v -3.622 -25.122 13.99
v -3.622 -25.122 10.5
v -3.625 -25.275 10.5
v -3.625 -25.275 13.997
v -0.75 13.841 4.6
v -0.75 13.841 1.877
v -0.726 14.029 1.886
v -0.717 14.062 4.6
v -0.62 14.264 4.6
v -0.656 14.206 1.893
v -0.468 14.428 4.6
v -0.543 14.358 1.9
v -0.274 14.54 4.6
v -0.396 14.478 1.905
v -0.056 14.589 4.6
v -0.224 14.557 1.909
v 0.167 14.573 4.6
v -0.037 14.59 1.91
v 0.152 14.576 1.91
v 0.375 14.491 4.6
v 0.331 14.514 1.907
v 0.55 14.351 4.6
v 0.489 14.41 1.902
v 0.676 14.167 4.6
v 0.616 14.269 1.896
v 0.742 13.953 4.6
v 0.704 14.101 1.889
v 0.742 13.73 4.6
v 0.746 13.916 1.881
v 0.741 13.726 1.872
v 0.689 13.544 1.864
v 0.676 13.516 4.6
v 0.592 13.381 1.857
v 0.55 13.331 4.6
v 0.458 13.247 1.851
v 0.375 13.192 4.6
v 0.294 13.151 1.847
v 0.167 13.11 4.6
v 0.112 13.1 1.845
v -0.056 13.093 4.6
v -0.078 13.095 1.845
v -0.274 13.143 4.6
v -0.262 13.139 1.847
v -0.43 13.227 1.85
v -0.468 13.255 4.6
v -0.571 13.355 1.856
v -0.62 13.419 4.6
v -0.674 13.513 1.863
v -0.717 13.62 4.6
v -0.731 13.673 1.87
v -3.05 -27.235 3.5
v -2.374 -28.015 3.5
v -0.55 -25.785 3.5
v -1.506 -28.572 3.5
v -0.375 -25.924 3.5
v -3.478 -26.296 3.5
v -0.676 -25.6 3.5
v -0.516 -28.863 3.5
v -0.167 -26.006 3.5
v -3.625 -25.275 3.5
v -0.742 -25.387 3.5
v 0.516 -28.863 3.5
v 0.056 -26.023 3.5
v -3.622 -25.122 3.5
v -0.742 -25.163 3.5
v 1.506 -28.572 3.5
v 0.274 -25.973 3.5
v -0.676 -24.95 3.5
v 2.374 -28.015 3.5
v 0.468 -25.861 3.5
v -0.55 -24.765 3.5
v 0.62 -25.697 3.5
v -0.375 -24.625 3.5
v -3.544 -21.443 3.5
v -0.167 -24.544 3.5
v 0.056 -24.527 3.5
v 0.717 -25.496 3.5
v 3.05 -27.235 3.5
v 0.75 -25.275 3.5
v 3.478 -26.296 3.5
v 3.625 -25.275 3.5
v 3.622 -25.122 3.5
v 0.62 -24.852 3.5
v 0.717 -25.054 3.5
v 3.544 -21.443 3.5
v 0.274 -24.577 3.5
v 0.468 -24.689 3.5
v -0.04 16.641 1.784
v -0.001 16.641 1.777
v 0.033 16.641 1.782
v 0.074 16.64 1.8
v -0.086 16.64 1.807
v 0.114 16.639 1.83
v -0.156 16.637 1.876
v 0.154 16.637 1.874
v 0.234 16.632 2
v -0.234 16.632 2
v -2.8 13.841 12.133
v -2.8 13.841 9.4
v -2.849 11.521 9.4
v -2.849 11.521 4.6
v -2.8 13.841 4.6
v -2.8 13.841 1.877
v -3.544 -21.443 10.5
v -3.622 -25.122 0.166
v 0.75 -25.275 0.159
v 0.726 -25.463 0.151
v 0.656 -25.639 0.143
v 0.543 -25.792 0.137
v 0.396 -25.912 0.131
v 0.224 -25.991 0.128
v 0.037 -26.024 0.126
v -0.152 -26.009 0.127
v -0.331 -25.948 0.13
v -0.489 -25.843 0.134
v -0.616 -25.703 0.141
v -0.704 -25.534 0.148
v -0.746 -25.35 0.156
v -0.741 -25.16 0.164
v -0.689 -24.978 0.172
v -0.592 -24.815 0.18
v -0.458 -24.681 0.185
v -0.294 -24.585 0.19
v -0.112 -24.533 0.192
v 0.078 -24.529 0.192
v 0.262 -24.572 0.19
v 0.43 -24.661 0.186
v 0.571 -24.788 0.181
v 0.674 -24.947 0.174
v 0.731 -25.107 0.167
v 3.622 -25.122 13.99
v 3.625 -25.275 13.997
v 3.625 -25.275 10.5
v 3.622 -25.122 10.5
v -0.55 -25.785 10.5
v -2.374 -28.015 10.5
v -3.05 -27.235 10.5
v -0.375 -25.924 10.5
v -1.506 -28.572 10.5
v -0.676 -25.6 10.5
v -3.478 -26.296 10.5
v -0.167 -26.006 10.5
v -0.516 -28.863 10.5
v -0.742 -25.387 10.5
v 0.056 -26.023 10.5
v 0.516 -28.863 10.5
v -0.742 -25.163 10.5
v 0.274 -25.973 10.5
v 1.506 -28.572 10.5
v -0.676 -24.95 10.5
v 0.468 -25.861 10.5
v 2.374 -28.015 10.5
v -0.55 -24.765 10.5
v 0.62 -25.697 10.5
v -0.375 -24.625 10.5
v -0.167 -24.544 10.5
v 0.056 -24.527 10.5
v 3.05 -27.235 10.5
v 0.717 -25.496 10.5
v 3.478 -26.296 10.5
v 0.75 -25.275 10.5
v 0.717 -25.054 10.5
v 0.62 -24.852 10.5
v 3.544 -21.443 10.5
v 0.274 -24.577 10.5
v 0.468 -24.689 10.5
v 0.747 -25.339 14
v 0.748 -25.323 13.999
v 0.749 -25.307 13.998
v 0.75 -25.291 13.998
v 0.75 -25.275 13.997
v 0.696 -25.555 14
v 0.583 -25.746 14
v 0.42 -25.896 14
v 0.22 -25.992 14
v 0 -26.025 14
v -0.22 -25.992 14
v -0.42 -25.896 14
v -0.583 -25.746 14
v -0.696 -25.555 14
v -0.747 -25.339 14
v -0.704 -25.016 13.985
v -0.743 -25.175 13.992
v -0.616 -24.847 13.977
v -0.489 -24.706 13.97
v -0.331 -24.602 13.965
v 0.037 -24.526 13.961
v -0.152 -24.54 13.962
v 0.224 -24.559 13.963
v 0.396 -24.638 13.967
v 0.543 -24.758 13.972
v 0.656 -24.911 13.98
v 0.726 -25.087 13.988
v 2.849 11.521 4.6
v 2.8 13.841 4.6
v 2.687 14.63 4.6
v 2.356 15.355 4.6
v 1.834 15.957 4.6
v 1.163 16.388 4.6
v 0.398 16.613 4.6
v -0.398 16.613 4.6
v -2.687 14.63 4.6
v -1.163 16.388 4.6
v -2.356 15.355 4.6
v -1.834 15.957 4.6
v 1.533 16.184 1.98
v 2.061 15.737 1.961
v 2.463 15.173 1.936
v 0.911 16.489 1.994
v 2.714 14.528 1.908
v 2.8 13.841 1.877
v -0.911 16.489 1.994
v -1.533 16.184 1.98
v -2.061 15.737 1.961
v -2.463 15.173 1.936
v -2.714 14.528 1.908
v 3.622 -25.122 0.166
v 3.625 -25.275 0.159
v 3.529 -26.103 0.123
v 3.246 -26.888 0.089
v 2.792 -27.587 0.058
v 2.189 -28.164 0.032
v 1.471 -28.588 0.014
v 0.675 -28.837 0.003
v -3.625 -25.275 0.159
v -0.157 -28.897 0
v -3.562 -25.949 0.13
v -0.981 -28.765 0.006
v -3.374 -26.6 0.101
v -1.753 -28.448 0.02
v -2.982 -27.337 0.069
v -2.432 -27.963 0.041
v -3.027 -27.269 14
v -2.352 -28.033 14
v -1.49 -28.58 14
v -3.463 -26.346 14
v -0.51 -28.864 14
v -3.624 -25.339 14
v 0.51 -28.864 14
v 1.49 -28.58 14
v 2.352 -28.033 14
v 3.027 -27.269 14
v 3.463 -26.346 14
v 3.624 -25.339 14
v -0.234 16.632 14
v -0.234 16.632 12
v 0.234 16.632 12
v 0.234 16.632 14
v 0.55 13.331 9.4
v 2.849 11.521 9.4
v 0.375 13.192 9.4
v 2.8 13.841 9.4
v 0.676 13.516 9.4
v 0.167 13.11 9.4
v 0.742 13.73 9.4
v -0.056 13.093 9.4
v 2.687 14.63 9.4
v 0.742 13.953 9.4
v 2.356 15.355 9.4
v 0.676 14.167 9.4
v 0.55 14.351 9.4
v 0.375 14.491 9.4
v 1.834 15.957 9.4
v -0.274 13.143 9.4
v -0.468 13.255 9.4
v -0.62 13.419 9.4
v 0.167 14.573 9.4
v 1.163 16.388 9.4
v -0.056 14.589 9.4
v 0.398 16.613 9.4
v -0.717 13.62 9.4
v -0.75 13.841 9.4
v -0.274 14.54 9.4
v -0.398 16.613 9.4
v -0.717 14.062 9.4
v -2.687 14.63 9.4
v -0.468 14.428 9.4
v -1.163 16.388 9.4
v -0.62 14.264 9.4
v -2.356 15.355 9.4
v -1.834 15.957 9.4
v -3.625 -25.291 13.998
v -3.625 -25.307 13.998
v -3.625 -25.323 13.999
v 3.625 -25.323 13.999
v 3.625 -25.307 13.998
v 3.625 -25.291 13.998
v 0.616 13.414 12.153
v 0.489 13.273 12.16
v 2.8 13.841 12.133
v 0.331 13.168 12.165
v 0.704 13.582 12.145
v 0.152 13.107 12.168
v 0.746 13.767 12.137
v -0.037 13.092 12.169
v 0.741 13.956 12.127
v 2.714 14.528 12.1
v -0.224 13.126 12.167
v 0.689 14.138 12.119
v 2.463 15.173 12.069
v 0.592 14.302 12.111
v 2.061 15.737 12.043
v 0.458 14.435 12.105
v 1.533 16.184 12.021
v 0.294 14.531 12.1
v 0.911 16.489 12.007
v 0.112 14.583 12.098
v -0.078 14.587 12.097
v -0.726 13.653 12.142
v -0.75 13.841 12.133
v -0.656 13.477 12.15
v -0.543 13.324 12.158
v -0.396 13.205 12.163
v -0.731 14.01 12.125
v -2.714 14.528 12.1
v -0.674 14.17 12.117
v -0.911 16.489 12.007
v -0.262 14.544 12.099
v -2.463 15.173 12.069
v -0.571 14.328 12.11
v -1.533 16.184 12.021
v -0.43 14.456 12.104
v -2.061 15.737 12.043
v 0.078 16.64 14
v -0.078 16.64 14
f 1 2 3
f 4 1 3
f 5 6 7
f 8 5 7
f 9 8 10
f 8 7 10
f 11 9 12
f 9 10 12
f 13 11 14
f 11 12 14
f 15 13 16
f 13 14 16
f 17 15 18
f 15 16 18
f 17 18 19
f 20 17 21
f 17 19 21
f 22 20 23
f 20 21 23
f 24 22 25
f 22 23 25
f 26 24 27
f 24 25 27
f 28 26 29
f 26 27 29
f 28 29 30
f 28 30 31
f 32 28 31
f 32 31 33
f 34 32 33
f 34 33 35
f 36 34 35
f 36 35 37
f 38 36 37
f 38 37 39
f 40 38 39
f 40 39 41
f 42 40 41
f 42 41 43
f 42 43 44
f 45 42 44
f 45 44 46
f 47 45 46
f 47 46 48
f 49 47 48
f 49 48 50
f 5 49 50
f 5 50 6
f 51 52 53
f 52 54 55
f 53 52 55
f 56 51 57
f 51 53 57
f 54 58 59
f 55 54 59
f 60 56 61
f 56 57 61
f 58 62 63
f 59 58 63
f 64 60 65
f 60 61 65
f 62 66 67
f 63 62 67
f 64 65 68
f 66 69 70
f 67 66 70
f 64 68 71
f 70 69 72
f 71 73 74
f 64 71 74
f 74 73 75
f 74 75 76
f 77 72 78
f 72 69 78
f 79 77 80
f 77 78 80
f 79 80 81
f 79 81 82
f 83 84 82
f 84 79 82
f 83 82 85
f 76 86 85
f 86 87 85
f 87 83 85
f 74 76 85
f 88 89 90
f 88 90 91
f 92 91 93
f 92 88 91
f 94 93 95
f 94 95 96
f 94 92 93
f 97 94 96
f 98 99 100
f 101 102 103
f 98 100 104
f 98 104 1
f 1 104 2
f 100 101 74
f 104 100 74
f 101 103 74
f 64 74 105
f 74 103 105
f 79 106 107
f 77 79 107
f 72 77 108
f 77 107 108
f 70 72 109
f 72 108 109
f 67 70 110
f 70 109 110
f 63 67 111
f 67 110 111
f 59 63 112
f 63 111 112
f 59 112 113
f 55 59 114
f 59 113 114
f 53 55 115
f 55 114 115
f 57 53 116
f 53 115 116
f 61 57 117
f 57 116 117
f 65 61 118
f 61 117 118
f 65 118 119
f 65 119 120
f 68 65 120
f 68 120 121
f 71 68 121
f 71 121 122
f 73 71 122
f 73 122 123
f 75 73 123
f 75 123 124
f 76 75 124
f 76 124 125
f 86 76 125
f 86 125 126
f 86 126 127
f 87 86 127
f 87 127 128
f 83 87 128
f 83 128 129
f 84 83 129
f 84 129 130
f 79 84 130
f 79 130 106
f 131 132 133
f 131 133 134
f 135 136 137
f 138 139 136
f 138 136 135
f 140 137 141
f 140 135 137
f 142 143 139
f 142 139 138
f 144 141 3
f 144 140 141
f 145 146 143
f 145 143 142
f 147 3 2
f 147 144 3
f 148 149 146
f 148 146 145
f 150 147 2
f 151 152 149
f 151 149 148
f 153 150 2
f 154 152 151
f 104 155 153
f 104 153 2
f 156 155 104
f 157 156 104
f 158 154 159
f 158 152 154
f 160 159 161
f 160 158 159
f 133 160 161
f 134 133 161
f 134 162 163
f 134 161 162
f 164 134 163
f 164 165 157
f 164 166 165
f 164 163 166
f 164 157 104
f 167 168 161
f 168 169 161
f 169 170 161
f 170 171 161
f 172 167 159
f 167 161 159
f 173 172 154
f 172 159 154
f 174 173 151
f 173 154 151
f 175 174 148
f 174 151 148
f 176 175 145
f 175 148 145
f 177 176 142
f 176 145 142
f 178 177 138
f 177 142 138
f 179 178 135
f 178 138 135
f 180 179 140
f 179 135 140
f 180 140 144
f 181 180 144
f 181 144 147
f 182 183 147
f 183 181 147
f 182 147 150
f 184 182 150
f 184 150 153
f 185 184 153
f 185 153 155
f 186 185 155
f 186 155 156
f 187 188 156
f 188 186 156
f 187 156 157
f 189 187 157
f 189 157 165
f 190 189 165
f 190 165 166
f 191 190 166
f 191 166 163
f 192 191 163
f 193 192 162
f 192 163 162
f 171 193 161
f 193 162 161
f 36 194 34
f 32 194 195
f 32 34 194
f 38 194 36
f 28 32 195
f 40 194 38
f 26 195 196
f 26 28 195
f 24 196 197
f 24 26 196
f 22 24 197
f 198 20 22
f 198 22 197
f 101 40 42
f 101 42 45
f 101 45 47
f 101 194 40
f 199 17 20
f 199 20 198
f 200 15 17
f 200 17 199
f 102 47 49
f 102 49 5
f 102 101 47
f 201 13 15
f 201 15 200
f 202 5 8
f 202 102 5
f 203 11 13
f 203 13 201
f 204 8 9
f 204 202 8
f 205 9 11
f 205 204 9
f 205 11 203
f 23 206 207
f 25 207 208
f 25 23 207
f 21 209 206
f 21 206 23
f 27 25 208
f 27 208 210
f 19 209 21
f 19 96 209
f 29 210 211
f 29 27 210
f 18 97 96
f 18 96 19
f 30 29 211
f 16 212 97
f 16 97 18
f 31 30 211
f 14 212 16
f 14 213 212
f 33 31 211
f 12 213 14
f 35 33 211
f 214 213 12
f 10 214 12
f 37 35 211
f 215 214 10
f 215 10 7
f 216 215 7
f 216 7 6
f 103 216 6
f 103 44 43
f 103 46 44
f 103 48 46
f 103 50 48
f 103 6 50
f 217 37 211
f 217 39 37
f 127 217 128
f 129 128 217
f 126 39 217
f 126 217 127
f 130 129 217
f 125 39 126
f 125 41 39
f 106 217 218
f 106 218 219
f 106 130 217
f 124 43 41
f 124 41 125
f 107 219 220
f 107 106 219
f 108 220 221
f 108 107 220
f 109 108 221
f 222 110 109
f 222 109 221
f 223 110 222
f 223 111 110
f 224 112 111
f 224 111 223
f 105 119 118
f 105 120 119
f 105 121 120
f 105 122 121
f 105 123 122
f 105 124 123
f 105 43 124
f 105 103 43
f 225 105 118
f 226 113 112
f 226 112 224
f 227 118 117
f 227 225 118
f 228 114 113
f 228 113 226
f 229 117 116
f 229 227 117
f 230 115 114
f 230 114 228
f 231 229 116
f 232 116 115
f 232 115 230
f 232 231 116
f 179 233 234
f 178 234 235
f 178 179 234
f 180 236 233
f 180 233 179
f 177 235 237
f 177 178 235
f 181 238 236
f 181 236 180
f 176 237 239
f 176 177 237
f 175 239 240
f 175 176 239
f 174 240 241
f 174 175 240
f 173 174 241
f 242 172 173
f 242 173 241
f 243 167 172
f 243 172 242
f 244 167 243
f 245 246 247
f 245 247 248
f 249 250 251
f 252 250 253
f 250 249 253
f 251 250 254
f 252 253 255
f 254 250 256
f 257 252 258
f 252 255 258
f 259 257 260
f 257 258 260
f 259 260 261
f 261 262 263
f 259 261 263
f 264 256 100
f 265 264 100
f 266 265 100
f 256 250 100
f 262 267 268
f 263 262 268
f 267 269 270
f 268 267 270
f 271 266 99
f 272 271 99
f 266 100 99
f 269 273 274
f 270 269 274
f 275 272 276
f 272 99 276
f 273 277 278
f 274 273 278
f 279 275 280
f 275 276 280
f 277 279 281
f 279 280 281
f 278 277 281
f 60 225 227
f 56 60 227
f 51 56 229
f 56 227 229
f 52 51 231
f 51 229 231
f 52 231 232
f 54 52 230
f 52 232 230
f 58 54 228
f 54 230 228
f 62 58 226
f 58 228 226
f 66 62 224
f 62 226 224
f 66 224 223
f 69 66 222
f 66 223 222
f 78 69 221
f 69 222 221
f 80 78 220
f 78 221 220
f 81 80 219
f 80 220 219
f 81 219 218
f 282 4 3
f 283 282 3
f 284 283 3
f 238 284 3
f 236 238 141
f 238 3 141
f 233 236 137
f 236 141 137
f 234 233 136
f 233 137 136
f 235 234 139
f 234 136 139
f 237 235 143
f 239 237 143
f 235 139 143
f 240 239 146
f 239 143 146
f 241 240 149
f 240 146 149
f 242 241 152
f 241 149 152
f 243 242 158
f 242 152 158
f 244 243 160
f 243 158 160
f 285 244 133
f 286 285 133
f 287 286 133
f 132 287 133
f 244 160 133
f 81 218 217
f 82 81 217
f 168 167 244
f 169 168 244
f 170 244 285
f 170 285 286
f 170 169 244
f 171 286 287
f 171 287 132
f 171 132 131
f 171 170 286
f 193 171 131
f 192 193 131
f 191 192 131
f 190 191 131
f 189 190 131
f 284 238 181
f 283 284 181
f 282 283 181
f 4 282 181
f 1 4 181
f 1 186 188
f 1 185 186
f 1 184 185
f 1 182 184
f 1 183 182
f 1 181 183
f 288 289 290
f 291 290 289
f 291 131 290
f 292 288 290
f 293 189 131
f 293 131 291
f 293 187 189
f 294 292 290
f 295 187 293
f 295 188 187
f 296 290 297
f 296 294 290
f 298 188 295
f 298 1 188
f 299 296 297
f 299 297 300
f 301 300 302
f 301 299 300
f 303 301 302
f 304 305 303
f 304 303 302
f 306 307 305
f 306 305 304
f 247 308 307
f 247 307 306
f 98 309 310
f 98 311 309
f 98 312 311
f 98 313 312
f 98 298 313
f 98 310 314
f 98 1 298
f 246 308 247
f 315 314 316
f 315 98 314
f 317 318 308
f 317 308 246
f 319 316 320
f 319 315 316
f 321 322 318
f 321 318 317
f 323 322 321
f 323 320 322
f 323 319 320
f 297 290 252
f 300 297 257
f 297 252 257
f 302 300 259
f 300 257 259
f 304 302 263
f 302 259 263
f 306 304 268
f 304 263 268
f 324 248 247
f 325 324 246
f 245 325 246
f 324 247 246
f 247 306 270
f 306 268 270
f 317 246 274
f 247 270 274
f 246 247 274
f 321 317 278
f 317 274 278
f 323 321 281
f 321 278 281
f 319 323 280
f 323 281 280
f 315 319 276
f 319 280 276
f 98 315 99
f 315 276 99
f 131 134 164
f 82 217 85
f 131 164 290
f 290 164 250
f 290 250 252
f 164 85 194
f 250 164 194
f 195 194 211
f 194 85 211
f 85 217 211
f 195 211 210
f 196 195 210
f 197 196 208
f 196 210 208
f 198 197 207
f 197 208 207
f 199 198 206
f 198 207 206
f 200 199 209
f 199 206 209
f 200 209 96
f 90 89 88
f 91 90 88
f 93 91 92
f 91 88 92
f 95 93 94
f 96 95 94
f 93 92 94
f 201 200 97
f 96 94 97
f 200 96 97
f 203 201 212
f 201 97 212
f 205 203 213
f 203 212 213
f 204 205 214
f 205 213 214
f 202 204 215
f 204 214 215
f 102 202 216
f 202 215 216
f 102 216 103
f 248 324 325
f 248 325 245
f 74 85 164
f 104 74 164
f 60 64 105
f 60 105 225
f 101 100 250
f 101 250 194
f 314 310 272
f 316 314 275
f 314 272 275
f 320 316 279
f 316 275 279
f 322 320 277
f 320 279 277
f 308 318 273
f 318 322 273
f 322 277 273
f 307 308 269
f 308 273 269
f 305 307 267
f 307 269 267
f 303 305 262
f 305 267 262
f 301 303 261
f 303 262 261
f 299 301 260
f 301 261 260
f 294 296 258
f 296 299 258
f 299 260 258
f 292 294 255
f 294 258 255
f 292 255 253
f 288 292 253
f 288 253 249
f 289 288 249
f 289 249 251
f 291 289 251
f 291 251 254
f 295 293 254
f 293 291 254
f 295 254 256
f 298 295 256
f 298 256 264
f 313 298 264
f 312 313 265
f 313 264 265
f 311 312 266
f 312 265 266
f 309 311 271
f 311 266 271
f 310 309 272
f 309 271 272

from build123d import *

# Parameters (mm, degrees)
F1_DEPTH = 14
F2_W     = 11.5
F2_H     = 2.4
F2_W_2   = 7.4604106426
F2_H_2   = 3.5
F3_DEPTH = 12.5


with BuildPart() as f1:
    # F0 (on Top) → F1 (new body)
    with BuildSketch(Plane.XY):
        with BuildLine():
            Line((3.625, -25.2749305218), (3.6217764293, -25.1220891128))
            ThreePointArc((3.6217764293, -25.1220891128), (0, -21.6499305218), (-3.6217764293, -25.1220891128))
            Line((-3.6217764293, -25.1220891128), (-3.625, -25.2749305218))
            Line((-3.625, -25.2749305218), (-0.75, -25.2749305218))
            ThreePointArc((-0.75, -25.2749305218), (0, -24.5249305218), (0.75, -25.2749305218))
            Line((0.75, -25.2749305218), (3.625, -25.2749305218))
        make_face()
        with BuildLine():
            Line((3.6217764293, -25.1220891128), (2.8, 13.841370428))
            ThreePointArc((2.8, 13.841370428), (0, 11.041370428), (-2.8, 13.841370428))
            Line((-2.8, 13.841370428), (-3.6217764293, -25.1220891128))
            ThreePointArc((-3.6217764293, -25.1220891128), (0, -21.6499305218), (3.6217764293, -25.1220891128))
        make_face()
        with BuildLine():
            Line((0.75, 13.841370428), (2.8, 13.841370428))
            ThreePointArc((2.8, 13.841370428), (0, 16.641370428), (-2.8, 13.841370428))
            Line((-2.8, 13.841370428), (-0.75, 13.841370428))
            ThreePointArc((-0.75, 13.841370428), (0, 14.591370428), (0.75, 13.841370428))
        make_face()
        with BuildLine():
            ThreePointArc((-3.625, -25.2749305218), (0, -28.8999305218), (3.625, -25.2749305218))
            Line((3.625, -25.2749305218), (0.75, -25.2749305218))
            ThreePointArc((0.75, -25.2749305218), (0, -26.0249305218), (-0.75, -25.2749305218))
            Line((-0.75, -25.2749305218), (-3.625, -25.2749305218))
        make_face()
        with BuildLine():
            ThreePointArc((-2.8, 13.841370428), (0, 11.041370428), (2.8, 13.841370428))
            Line((2.8, 13.841370428), (0.75, 13.841370428))
            ThreePointArc((0.75, 13.841370428), (0, 13.091370428), (-0.75, 13.841370428))
            Line((-0.75, 13.841370428), (-2.8, 13.841370428))
        make_face()
    extrude(amount=F1_DEPTH)

    # F2 (on Right) → F3 (cut, symmetric)
    with BuildSketch(Plane.YZ):
        Polygon((-28.9036631584, 17.2806195915), (-28.9036631584, 14.1698746011), (16.6315902025, 12), (16.6315902025, 18.462985754), align=None)
        Polygon((16.6315902025, 2), (-28.9036631584, 0), (16.7194342289, 0), align=None)
        with Locations((17.2709319741, 5.8)):
            Rectangle(F2_W, F2_H)
        with Locations((17.2709319741, 8.2)):
            Rectangle(F2_W, F2_H)
        with Locations((-25.1734578371, 8.75)):
            Rectangle(F2_W_2, F2_H_2)
        with Locations((-25.1734578371, 5.25)):
            Rectangle(F2_W_2, F2_H_2)
    extrude(amount=F3_DEPTH, both=True, mode=Mode.SUBTRACT)


solid = f1.part
